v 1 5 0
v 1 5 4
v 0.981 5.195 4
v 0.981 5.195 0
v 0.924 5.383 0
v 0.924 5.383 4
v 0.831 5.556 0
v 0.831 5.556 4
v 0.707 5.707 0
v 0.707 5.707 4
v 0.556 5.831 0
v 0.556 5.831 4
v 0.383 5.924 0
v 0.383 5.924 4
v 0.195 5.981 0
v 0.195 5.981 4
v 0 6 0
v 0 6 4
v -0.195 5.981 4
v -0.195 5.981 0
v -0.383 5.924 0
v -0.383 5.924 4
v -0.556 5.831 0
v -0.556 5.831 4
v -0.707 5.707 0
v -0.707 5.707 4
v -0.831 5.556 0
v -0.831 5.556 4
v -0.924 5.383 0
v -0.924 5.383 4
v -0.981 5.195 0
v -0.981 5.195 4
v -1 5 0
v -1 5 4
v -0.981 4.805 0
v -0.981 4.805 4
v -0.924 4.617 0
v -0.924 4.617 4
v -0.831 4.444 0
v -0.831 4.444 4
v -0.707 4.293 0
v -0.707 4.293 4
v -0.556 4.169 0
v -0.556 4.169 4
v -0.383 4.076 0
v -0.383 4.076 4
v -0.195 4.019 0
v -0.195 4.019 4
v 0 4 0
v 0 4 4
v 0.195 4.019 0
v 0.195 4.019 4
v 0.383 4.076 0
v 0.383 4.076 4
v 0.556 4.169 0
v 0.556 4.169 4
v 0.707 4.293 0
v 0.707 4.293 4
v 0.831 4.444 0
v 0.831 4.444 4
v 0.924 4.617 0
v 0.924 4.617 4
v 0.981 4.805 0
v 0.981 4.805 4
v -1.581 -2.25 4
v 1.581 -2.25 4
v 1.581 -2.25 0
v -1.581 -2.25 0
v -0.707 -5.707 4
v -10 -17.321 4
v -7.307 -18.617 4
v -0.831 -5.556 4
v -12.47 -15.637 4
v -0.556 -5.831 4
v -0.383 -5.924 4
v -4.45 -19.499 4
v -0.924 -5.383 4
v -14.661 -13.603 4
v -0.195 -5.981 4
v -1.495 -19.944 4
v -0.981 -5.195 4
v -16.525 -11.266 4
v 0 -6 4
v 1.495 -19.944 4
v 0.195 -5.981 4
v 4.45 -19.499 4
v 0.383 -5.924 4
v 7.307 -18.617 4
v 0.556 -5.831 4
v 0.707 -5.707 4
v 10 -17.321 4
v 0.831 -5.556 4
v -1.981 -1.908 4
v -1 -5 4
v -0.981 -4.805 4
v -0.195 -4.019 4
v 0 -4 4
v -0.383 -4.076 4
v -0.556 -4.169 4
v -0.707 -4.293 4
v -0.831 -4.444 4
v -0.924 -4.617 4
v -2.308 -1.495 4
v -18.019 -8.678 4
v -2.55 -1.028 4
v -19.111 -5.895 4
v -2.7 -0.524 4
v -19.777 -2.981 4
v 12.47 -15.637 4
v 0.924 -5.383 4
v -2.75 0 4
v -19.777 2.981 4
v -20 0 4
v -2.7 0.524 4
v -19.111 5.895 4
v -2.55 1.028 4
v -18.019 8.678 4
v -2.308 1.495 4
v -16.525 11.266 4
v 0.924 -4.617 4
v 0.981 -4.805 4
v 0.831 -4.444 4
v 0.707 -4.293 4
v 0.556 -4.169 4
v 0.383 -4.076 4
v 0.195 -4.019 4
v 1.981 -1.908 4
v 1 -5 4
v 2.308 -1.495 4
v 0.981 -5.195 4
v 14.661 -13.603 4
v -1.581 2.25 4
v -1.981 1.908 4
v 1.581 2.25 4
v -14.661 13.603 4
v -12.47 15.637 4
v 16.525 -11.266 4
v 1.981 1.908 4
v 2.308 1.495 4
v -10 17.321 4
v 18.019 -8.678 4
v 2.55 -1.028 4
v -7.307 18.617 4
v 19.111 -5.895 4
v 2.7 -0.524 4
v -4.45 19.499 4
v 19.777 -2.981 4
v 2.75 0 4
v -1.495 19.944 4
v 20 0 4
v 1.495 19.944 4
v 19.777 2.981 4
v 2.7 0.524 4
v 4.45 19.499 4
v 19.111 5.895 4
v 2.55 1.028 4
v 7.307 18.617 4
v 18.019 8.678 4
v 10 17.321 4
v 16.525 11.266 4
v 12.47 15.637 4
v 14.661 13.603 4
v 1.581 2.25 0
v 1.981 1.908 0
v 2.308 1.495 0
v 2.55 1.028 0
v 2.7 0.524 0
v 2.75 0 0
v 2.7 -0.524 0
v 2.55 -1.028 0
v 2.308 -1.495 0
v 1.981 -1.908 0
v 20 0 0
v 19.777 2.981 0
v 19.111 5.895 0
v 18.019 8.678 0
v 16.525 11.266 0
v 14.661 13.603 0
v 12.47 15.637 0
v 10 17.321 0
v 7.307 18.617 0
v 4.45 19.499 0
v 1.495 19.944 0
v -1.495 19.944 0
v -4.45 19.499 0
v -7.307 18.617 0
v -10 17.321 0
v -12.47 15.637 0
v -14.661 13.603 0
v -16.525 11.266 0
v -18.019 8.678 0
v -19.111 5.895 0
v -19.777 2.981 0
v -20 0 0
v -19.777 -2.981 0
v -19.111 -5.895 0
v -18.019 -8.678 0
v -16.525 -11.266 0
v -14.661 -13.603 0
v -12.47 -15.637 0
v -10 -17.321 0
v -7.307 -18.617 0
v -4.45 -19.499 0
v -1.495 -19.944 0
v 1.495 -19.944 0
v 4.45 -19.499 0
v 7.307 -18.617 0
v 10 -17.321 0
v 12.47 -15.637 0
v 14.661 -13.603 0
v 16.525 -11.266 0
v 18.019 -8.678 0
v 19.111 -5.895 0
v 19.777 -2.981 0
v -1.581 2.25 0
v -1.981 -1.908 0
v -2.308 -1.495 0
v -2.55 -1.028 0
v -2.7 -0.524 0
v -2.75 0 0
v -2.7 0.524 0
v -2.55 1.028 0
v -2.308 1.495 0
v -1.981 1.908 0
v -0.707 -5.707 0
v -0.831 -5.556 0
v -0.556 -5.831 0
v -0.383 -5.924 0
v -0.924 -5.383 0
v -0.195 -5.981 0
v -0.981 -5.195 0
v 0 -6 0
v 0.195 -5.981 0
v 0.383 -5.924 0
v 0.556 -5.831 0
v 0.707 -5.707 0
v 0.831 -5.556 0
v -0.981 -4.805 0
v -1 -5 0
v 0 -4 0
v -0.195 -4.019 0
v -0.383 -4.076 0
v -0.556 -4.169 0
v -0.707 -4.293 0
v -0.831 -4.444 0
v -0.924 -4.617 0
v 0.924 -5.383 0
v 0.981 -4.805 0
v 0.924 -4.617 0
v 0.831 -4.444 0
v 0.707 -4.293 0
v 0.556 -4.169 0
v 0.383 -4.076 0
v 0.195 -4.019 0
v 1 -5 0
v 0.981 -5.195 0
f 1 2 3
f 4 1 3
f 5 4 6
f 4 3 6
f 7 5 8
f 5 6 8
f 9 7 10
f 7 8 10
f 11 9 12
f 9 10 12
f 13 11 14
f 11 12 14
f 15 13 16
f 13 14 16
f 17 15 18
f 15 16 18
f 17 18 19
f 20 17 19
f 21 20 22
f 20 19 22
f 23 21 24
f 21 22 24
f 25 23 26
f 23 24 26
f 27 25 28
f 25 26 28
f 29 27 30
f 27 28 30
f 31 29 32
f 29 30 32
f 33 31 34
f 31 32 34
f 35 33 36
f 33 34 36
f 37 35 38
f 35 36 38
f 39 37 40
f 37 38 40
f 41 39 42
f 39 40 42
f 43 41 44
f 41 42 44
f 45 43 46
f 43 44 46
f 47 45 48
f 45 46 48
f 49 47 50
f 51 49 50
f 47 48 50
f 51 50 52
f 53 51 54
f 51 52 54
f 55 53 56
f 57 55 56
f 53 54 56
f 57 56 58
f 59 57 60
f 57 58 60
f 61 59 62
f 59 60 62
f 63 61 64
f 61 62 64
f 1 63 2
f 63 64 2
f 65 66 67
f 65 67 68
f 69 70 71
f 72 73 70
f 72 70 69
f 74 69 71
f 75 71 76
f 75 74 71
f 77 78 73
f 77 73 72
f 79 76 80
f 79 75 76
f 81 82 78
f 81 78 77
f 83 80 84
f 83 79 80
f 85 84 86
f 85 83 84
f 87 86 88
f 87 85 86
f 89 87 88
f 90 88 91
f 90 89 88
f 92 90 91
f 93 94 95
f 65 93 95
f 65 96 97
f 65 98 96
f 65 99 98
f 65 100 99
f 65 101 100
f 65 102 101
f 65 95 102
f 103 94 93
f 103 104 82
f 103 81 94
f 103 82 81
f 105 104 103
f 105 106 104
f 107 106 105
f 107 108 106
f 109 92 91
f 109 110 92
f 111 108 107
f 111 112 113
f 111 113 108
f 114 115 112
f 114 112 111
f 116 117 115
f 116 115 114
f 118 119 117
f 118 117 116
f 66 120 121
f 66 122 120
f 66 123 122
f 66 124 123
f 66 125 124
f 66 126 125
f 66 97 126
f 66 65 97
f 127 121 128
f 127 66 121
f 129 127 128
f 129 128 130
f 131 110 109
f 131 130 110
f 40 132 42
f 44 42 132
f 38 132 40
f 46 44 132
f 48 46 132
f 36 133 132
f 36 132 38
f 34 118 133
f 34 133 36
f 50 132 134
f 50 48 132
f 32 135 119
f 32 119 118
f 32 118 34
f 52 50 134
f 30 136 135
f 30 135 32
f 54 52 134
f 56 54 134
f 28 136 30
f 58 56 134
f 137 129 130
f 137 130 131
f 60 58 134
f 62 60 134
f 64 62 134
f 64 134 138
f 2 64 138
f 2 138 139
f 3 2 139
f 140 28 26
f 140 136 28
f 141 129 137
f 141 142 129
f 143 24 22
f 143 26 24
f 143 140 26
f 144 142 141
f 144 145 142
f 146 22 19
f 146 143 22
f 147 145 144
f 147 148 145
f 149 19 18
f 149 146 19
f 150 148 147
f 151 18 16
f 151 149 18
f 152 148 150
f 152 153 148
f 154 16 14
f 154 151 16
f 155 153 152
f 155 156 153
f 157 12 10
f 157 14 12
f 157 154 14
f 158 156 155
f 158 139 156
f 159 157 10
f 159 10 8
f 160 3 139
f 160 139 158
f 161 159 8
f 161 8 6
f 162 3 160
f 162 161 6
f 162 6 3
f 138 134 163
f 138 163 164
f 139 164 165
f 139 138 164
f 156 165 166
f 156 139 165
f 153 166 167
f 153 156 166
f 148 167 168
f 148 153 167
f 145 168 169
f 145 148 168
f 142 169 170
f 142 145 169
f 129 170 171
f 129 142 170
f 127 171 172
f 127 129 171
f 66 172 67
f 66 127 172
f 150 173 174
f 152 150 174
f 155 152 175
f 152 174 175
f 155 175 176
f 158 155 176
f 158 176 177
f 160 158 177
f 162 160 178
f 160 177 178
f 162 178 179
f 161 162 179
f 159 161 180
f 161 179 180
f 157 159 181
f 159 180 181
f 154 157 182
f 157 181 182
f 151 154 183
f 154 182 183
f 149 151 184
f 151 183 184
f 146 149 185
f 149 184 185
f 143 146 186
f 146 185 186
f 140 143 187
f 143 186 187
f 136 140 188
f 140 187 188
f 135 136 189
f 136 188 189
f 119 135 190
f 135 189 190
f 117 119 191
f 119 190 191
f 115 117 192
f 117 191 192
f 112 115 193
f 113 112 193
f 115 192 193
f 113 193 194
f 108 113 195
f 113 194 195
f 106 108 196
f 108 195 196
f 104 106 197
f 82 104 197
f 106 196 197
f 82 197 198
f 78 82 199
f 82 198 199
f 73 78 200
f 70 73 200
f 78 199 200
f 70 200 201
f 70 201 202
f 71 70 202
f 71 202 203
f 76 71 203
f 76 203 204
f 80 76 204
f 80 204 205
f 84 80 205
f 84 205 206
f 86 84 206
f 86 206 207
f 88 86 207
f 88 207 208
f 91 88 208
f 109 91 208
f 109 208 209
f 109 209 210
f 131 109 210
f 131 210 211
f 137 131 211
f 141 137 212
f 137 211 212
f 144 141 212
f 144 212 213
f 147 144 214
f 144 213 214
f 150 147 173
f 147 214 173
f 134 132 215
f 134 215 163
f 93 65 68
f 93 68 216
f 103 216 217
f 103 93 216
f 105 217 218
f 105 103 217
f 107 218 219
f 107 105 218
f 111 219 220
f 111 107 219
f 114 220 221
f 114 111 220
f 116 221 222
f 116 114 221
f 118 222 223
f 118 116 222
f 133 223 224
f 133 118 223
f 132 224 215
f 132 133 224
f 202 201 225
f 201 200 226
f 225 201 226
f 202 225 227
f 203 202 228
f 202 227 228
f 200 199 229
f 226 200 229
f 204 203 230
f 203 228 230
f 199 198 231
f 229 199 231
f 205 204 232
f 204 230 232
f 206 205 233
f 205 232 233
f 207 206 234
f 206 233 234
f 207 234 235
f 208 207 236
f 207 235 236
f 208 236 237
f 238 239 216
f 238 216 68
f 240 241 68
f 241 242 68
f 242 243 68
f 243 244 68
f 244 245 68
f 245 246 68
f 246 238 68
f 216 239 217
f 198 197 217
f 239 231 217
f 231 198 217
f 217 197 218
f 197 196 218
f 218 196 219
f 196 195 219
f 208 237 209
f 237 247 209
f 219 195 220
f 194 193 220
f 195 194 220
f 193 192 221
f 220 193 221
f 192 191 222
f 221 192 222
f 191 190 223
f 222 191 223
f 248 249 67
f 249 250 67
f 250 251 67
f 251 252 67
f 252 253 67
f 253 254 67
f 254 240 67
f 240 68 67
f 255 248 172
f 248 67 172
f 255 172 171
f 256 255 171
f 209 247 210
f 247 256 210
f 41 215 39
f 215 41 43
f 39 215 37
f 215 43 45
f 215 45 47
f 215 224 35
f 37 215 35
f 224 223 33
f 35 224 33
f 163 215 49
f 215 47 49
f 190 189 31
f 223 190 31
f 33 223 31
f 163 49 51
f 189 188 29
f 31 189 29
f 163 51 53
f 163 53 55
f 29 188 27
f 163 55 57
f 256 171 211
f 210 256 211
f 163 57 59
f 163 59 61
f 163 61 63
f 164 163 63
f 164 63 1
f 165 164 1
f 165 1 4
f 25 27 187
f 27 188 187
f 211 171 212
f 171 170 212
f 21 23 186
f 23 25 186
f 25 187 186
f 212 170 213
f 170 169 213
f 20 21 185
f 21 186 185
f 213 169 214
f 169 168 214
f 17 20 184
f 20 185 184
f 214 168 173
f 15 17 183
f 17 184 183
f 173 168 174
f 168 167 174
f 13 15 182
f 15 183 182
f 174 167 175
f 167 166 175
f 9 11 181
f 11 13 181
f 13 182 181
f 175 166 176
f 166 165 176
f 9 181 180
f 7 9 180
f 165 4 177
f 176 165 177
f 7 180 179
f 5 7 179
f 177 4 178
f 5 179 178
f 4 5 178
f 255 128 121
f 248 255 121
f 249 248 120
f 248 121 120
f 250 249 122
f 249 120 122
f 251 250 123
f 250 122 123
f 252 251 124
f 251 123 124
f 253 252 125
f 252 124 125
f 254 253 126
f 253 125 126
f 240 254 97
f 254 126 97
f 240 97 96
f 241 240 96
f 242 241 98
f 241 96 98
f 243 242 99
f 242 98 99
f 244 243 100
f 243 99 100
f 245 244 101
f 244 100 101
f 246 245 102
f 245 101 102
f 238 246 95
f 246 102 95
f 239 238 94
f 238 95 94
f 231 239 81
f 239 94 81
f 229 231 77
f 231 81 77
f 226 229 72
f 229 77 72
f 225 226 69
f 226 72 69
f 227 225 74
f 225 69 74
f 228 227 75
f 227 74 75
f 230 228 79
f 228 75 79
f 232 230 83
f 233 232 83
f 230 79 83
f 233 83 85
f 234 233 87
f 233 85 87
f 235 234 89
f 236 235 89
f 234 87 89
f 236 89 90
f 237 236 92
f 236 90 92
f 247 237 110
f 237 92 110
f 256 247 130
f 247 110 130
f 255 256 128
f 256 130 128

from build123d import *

# Parameters (mm, degrees)
SKETCH_1_R          = 20
EXTRUDE_1_DEPTH     = 4
SKETCH_2_R          = 1
CUT_EXTRUDE_1_DEPTH = 4


with BuildPart() as part:
    # Эскиз1 → Бобышка-Вытянуть1 (new body)
    with BuildSketch(Plane.XY):
        Circle(SKETCH_1_R)
    extrude(amount=EXTRUDE_1_DEPTH)

    # Эскиз2 → Вырез-Вытянуть1 (cut)
    with BuildSketch(Plane.XY.offset(4)):
        with Locations((0, 5)):
            Circle(SKETCH_2_R)
        with Locations((0, -5)):
            Circle(SKETCH_2_R)
        with BuildLine():
            Line((-1.58113883, 2.25), (1.58113883, 2.25))
            ThreePointArc((1.58113883, 2.25), (2.75, 0), (1.58113883, -2.25))
            Line((1.58113883, -2.25), (-1.58113883, -2.25))
            ThreePointArc((-1.58113883, -2.25), (-2.75, 0), (-1.58113883, 2.25))
        make_face()
    extrude(amount=-CUT_EXTRUDE_1_DEPTH, mode=Mode.SUBTRACT)


solid = part.part
